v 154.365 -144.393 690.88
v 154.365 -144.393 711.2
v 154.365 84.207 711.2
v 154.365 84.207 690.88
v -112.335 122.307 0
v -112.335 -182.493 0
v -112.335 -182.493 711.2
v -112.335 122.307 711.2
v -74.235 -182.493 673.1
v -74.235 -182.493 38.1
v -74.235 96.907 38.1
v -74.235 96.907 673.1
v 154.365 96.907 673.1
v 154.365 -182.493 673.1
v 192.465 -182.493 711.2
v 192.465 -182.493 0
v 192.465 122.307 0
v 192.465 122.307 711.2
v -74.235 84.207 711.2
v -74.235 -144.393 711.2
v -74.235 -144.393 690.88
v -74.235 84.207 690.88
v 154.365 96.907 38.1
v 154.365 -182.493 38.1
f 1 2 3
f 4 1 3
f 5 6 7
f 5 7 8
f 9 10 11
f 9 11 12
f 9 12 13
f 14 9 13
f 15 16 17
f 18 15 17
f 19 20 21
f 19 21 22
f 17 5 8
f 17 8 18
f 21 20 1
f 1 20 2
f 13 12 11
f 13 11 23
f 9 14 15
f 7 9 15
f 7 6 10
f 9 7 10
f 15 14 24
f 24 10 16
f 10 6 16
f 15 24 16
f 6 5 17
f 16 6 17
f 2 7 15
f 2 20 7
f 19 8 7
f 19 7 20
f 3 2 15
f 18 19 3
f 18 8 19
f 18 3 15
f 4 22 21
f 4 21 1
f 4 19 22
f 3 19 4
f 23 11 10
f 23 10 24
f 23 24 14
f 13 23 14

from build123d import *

# Parameters (mm, degrees)
F0_W     = 304.8
F0_H     = 304.8
F1_DEPTH = 711.2
F2_W     = 228.6
F2_H     = 635
F3_DEPTH = 279.4
F4_W     = 228.6
F4_H     = 228.6
F5_DEPTH = 20.32


with BuildPart() as f1:
    # F0 (on Top) → F1 (new body)
    with BuildSketch(Plane.XY):
        with Locations((40.065344, -30.093398)):
            Rectangle(F0_W, F0_H)
    extrude(amount=F1_DEPTH)

    # F2 (on face) → F3 (cut)
    with BuildSketch(Plane.XZ.offset(182.493398)):
        with Locations((40.065344, 355.6)):
            Rectangle(F2_W, F2_H)
    extrude(amount=-F3_DEPTH, mode=Mode.SUBTRACT)

    # F4 (on face) → F5 (cut)
    with BuildSketch(Plane.XY.offset(711.2)):
        with Locations((40.065344, -30.093398)):
            Rectangle(F4_W, F4_H)
    extrude(amount=-F5_DEPTH, mode=Mode.SUBTRACT)


solid = f1.part
